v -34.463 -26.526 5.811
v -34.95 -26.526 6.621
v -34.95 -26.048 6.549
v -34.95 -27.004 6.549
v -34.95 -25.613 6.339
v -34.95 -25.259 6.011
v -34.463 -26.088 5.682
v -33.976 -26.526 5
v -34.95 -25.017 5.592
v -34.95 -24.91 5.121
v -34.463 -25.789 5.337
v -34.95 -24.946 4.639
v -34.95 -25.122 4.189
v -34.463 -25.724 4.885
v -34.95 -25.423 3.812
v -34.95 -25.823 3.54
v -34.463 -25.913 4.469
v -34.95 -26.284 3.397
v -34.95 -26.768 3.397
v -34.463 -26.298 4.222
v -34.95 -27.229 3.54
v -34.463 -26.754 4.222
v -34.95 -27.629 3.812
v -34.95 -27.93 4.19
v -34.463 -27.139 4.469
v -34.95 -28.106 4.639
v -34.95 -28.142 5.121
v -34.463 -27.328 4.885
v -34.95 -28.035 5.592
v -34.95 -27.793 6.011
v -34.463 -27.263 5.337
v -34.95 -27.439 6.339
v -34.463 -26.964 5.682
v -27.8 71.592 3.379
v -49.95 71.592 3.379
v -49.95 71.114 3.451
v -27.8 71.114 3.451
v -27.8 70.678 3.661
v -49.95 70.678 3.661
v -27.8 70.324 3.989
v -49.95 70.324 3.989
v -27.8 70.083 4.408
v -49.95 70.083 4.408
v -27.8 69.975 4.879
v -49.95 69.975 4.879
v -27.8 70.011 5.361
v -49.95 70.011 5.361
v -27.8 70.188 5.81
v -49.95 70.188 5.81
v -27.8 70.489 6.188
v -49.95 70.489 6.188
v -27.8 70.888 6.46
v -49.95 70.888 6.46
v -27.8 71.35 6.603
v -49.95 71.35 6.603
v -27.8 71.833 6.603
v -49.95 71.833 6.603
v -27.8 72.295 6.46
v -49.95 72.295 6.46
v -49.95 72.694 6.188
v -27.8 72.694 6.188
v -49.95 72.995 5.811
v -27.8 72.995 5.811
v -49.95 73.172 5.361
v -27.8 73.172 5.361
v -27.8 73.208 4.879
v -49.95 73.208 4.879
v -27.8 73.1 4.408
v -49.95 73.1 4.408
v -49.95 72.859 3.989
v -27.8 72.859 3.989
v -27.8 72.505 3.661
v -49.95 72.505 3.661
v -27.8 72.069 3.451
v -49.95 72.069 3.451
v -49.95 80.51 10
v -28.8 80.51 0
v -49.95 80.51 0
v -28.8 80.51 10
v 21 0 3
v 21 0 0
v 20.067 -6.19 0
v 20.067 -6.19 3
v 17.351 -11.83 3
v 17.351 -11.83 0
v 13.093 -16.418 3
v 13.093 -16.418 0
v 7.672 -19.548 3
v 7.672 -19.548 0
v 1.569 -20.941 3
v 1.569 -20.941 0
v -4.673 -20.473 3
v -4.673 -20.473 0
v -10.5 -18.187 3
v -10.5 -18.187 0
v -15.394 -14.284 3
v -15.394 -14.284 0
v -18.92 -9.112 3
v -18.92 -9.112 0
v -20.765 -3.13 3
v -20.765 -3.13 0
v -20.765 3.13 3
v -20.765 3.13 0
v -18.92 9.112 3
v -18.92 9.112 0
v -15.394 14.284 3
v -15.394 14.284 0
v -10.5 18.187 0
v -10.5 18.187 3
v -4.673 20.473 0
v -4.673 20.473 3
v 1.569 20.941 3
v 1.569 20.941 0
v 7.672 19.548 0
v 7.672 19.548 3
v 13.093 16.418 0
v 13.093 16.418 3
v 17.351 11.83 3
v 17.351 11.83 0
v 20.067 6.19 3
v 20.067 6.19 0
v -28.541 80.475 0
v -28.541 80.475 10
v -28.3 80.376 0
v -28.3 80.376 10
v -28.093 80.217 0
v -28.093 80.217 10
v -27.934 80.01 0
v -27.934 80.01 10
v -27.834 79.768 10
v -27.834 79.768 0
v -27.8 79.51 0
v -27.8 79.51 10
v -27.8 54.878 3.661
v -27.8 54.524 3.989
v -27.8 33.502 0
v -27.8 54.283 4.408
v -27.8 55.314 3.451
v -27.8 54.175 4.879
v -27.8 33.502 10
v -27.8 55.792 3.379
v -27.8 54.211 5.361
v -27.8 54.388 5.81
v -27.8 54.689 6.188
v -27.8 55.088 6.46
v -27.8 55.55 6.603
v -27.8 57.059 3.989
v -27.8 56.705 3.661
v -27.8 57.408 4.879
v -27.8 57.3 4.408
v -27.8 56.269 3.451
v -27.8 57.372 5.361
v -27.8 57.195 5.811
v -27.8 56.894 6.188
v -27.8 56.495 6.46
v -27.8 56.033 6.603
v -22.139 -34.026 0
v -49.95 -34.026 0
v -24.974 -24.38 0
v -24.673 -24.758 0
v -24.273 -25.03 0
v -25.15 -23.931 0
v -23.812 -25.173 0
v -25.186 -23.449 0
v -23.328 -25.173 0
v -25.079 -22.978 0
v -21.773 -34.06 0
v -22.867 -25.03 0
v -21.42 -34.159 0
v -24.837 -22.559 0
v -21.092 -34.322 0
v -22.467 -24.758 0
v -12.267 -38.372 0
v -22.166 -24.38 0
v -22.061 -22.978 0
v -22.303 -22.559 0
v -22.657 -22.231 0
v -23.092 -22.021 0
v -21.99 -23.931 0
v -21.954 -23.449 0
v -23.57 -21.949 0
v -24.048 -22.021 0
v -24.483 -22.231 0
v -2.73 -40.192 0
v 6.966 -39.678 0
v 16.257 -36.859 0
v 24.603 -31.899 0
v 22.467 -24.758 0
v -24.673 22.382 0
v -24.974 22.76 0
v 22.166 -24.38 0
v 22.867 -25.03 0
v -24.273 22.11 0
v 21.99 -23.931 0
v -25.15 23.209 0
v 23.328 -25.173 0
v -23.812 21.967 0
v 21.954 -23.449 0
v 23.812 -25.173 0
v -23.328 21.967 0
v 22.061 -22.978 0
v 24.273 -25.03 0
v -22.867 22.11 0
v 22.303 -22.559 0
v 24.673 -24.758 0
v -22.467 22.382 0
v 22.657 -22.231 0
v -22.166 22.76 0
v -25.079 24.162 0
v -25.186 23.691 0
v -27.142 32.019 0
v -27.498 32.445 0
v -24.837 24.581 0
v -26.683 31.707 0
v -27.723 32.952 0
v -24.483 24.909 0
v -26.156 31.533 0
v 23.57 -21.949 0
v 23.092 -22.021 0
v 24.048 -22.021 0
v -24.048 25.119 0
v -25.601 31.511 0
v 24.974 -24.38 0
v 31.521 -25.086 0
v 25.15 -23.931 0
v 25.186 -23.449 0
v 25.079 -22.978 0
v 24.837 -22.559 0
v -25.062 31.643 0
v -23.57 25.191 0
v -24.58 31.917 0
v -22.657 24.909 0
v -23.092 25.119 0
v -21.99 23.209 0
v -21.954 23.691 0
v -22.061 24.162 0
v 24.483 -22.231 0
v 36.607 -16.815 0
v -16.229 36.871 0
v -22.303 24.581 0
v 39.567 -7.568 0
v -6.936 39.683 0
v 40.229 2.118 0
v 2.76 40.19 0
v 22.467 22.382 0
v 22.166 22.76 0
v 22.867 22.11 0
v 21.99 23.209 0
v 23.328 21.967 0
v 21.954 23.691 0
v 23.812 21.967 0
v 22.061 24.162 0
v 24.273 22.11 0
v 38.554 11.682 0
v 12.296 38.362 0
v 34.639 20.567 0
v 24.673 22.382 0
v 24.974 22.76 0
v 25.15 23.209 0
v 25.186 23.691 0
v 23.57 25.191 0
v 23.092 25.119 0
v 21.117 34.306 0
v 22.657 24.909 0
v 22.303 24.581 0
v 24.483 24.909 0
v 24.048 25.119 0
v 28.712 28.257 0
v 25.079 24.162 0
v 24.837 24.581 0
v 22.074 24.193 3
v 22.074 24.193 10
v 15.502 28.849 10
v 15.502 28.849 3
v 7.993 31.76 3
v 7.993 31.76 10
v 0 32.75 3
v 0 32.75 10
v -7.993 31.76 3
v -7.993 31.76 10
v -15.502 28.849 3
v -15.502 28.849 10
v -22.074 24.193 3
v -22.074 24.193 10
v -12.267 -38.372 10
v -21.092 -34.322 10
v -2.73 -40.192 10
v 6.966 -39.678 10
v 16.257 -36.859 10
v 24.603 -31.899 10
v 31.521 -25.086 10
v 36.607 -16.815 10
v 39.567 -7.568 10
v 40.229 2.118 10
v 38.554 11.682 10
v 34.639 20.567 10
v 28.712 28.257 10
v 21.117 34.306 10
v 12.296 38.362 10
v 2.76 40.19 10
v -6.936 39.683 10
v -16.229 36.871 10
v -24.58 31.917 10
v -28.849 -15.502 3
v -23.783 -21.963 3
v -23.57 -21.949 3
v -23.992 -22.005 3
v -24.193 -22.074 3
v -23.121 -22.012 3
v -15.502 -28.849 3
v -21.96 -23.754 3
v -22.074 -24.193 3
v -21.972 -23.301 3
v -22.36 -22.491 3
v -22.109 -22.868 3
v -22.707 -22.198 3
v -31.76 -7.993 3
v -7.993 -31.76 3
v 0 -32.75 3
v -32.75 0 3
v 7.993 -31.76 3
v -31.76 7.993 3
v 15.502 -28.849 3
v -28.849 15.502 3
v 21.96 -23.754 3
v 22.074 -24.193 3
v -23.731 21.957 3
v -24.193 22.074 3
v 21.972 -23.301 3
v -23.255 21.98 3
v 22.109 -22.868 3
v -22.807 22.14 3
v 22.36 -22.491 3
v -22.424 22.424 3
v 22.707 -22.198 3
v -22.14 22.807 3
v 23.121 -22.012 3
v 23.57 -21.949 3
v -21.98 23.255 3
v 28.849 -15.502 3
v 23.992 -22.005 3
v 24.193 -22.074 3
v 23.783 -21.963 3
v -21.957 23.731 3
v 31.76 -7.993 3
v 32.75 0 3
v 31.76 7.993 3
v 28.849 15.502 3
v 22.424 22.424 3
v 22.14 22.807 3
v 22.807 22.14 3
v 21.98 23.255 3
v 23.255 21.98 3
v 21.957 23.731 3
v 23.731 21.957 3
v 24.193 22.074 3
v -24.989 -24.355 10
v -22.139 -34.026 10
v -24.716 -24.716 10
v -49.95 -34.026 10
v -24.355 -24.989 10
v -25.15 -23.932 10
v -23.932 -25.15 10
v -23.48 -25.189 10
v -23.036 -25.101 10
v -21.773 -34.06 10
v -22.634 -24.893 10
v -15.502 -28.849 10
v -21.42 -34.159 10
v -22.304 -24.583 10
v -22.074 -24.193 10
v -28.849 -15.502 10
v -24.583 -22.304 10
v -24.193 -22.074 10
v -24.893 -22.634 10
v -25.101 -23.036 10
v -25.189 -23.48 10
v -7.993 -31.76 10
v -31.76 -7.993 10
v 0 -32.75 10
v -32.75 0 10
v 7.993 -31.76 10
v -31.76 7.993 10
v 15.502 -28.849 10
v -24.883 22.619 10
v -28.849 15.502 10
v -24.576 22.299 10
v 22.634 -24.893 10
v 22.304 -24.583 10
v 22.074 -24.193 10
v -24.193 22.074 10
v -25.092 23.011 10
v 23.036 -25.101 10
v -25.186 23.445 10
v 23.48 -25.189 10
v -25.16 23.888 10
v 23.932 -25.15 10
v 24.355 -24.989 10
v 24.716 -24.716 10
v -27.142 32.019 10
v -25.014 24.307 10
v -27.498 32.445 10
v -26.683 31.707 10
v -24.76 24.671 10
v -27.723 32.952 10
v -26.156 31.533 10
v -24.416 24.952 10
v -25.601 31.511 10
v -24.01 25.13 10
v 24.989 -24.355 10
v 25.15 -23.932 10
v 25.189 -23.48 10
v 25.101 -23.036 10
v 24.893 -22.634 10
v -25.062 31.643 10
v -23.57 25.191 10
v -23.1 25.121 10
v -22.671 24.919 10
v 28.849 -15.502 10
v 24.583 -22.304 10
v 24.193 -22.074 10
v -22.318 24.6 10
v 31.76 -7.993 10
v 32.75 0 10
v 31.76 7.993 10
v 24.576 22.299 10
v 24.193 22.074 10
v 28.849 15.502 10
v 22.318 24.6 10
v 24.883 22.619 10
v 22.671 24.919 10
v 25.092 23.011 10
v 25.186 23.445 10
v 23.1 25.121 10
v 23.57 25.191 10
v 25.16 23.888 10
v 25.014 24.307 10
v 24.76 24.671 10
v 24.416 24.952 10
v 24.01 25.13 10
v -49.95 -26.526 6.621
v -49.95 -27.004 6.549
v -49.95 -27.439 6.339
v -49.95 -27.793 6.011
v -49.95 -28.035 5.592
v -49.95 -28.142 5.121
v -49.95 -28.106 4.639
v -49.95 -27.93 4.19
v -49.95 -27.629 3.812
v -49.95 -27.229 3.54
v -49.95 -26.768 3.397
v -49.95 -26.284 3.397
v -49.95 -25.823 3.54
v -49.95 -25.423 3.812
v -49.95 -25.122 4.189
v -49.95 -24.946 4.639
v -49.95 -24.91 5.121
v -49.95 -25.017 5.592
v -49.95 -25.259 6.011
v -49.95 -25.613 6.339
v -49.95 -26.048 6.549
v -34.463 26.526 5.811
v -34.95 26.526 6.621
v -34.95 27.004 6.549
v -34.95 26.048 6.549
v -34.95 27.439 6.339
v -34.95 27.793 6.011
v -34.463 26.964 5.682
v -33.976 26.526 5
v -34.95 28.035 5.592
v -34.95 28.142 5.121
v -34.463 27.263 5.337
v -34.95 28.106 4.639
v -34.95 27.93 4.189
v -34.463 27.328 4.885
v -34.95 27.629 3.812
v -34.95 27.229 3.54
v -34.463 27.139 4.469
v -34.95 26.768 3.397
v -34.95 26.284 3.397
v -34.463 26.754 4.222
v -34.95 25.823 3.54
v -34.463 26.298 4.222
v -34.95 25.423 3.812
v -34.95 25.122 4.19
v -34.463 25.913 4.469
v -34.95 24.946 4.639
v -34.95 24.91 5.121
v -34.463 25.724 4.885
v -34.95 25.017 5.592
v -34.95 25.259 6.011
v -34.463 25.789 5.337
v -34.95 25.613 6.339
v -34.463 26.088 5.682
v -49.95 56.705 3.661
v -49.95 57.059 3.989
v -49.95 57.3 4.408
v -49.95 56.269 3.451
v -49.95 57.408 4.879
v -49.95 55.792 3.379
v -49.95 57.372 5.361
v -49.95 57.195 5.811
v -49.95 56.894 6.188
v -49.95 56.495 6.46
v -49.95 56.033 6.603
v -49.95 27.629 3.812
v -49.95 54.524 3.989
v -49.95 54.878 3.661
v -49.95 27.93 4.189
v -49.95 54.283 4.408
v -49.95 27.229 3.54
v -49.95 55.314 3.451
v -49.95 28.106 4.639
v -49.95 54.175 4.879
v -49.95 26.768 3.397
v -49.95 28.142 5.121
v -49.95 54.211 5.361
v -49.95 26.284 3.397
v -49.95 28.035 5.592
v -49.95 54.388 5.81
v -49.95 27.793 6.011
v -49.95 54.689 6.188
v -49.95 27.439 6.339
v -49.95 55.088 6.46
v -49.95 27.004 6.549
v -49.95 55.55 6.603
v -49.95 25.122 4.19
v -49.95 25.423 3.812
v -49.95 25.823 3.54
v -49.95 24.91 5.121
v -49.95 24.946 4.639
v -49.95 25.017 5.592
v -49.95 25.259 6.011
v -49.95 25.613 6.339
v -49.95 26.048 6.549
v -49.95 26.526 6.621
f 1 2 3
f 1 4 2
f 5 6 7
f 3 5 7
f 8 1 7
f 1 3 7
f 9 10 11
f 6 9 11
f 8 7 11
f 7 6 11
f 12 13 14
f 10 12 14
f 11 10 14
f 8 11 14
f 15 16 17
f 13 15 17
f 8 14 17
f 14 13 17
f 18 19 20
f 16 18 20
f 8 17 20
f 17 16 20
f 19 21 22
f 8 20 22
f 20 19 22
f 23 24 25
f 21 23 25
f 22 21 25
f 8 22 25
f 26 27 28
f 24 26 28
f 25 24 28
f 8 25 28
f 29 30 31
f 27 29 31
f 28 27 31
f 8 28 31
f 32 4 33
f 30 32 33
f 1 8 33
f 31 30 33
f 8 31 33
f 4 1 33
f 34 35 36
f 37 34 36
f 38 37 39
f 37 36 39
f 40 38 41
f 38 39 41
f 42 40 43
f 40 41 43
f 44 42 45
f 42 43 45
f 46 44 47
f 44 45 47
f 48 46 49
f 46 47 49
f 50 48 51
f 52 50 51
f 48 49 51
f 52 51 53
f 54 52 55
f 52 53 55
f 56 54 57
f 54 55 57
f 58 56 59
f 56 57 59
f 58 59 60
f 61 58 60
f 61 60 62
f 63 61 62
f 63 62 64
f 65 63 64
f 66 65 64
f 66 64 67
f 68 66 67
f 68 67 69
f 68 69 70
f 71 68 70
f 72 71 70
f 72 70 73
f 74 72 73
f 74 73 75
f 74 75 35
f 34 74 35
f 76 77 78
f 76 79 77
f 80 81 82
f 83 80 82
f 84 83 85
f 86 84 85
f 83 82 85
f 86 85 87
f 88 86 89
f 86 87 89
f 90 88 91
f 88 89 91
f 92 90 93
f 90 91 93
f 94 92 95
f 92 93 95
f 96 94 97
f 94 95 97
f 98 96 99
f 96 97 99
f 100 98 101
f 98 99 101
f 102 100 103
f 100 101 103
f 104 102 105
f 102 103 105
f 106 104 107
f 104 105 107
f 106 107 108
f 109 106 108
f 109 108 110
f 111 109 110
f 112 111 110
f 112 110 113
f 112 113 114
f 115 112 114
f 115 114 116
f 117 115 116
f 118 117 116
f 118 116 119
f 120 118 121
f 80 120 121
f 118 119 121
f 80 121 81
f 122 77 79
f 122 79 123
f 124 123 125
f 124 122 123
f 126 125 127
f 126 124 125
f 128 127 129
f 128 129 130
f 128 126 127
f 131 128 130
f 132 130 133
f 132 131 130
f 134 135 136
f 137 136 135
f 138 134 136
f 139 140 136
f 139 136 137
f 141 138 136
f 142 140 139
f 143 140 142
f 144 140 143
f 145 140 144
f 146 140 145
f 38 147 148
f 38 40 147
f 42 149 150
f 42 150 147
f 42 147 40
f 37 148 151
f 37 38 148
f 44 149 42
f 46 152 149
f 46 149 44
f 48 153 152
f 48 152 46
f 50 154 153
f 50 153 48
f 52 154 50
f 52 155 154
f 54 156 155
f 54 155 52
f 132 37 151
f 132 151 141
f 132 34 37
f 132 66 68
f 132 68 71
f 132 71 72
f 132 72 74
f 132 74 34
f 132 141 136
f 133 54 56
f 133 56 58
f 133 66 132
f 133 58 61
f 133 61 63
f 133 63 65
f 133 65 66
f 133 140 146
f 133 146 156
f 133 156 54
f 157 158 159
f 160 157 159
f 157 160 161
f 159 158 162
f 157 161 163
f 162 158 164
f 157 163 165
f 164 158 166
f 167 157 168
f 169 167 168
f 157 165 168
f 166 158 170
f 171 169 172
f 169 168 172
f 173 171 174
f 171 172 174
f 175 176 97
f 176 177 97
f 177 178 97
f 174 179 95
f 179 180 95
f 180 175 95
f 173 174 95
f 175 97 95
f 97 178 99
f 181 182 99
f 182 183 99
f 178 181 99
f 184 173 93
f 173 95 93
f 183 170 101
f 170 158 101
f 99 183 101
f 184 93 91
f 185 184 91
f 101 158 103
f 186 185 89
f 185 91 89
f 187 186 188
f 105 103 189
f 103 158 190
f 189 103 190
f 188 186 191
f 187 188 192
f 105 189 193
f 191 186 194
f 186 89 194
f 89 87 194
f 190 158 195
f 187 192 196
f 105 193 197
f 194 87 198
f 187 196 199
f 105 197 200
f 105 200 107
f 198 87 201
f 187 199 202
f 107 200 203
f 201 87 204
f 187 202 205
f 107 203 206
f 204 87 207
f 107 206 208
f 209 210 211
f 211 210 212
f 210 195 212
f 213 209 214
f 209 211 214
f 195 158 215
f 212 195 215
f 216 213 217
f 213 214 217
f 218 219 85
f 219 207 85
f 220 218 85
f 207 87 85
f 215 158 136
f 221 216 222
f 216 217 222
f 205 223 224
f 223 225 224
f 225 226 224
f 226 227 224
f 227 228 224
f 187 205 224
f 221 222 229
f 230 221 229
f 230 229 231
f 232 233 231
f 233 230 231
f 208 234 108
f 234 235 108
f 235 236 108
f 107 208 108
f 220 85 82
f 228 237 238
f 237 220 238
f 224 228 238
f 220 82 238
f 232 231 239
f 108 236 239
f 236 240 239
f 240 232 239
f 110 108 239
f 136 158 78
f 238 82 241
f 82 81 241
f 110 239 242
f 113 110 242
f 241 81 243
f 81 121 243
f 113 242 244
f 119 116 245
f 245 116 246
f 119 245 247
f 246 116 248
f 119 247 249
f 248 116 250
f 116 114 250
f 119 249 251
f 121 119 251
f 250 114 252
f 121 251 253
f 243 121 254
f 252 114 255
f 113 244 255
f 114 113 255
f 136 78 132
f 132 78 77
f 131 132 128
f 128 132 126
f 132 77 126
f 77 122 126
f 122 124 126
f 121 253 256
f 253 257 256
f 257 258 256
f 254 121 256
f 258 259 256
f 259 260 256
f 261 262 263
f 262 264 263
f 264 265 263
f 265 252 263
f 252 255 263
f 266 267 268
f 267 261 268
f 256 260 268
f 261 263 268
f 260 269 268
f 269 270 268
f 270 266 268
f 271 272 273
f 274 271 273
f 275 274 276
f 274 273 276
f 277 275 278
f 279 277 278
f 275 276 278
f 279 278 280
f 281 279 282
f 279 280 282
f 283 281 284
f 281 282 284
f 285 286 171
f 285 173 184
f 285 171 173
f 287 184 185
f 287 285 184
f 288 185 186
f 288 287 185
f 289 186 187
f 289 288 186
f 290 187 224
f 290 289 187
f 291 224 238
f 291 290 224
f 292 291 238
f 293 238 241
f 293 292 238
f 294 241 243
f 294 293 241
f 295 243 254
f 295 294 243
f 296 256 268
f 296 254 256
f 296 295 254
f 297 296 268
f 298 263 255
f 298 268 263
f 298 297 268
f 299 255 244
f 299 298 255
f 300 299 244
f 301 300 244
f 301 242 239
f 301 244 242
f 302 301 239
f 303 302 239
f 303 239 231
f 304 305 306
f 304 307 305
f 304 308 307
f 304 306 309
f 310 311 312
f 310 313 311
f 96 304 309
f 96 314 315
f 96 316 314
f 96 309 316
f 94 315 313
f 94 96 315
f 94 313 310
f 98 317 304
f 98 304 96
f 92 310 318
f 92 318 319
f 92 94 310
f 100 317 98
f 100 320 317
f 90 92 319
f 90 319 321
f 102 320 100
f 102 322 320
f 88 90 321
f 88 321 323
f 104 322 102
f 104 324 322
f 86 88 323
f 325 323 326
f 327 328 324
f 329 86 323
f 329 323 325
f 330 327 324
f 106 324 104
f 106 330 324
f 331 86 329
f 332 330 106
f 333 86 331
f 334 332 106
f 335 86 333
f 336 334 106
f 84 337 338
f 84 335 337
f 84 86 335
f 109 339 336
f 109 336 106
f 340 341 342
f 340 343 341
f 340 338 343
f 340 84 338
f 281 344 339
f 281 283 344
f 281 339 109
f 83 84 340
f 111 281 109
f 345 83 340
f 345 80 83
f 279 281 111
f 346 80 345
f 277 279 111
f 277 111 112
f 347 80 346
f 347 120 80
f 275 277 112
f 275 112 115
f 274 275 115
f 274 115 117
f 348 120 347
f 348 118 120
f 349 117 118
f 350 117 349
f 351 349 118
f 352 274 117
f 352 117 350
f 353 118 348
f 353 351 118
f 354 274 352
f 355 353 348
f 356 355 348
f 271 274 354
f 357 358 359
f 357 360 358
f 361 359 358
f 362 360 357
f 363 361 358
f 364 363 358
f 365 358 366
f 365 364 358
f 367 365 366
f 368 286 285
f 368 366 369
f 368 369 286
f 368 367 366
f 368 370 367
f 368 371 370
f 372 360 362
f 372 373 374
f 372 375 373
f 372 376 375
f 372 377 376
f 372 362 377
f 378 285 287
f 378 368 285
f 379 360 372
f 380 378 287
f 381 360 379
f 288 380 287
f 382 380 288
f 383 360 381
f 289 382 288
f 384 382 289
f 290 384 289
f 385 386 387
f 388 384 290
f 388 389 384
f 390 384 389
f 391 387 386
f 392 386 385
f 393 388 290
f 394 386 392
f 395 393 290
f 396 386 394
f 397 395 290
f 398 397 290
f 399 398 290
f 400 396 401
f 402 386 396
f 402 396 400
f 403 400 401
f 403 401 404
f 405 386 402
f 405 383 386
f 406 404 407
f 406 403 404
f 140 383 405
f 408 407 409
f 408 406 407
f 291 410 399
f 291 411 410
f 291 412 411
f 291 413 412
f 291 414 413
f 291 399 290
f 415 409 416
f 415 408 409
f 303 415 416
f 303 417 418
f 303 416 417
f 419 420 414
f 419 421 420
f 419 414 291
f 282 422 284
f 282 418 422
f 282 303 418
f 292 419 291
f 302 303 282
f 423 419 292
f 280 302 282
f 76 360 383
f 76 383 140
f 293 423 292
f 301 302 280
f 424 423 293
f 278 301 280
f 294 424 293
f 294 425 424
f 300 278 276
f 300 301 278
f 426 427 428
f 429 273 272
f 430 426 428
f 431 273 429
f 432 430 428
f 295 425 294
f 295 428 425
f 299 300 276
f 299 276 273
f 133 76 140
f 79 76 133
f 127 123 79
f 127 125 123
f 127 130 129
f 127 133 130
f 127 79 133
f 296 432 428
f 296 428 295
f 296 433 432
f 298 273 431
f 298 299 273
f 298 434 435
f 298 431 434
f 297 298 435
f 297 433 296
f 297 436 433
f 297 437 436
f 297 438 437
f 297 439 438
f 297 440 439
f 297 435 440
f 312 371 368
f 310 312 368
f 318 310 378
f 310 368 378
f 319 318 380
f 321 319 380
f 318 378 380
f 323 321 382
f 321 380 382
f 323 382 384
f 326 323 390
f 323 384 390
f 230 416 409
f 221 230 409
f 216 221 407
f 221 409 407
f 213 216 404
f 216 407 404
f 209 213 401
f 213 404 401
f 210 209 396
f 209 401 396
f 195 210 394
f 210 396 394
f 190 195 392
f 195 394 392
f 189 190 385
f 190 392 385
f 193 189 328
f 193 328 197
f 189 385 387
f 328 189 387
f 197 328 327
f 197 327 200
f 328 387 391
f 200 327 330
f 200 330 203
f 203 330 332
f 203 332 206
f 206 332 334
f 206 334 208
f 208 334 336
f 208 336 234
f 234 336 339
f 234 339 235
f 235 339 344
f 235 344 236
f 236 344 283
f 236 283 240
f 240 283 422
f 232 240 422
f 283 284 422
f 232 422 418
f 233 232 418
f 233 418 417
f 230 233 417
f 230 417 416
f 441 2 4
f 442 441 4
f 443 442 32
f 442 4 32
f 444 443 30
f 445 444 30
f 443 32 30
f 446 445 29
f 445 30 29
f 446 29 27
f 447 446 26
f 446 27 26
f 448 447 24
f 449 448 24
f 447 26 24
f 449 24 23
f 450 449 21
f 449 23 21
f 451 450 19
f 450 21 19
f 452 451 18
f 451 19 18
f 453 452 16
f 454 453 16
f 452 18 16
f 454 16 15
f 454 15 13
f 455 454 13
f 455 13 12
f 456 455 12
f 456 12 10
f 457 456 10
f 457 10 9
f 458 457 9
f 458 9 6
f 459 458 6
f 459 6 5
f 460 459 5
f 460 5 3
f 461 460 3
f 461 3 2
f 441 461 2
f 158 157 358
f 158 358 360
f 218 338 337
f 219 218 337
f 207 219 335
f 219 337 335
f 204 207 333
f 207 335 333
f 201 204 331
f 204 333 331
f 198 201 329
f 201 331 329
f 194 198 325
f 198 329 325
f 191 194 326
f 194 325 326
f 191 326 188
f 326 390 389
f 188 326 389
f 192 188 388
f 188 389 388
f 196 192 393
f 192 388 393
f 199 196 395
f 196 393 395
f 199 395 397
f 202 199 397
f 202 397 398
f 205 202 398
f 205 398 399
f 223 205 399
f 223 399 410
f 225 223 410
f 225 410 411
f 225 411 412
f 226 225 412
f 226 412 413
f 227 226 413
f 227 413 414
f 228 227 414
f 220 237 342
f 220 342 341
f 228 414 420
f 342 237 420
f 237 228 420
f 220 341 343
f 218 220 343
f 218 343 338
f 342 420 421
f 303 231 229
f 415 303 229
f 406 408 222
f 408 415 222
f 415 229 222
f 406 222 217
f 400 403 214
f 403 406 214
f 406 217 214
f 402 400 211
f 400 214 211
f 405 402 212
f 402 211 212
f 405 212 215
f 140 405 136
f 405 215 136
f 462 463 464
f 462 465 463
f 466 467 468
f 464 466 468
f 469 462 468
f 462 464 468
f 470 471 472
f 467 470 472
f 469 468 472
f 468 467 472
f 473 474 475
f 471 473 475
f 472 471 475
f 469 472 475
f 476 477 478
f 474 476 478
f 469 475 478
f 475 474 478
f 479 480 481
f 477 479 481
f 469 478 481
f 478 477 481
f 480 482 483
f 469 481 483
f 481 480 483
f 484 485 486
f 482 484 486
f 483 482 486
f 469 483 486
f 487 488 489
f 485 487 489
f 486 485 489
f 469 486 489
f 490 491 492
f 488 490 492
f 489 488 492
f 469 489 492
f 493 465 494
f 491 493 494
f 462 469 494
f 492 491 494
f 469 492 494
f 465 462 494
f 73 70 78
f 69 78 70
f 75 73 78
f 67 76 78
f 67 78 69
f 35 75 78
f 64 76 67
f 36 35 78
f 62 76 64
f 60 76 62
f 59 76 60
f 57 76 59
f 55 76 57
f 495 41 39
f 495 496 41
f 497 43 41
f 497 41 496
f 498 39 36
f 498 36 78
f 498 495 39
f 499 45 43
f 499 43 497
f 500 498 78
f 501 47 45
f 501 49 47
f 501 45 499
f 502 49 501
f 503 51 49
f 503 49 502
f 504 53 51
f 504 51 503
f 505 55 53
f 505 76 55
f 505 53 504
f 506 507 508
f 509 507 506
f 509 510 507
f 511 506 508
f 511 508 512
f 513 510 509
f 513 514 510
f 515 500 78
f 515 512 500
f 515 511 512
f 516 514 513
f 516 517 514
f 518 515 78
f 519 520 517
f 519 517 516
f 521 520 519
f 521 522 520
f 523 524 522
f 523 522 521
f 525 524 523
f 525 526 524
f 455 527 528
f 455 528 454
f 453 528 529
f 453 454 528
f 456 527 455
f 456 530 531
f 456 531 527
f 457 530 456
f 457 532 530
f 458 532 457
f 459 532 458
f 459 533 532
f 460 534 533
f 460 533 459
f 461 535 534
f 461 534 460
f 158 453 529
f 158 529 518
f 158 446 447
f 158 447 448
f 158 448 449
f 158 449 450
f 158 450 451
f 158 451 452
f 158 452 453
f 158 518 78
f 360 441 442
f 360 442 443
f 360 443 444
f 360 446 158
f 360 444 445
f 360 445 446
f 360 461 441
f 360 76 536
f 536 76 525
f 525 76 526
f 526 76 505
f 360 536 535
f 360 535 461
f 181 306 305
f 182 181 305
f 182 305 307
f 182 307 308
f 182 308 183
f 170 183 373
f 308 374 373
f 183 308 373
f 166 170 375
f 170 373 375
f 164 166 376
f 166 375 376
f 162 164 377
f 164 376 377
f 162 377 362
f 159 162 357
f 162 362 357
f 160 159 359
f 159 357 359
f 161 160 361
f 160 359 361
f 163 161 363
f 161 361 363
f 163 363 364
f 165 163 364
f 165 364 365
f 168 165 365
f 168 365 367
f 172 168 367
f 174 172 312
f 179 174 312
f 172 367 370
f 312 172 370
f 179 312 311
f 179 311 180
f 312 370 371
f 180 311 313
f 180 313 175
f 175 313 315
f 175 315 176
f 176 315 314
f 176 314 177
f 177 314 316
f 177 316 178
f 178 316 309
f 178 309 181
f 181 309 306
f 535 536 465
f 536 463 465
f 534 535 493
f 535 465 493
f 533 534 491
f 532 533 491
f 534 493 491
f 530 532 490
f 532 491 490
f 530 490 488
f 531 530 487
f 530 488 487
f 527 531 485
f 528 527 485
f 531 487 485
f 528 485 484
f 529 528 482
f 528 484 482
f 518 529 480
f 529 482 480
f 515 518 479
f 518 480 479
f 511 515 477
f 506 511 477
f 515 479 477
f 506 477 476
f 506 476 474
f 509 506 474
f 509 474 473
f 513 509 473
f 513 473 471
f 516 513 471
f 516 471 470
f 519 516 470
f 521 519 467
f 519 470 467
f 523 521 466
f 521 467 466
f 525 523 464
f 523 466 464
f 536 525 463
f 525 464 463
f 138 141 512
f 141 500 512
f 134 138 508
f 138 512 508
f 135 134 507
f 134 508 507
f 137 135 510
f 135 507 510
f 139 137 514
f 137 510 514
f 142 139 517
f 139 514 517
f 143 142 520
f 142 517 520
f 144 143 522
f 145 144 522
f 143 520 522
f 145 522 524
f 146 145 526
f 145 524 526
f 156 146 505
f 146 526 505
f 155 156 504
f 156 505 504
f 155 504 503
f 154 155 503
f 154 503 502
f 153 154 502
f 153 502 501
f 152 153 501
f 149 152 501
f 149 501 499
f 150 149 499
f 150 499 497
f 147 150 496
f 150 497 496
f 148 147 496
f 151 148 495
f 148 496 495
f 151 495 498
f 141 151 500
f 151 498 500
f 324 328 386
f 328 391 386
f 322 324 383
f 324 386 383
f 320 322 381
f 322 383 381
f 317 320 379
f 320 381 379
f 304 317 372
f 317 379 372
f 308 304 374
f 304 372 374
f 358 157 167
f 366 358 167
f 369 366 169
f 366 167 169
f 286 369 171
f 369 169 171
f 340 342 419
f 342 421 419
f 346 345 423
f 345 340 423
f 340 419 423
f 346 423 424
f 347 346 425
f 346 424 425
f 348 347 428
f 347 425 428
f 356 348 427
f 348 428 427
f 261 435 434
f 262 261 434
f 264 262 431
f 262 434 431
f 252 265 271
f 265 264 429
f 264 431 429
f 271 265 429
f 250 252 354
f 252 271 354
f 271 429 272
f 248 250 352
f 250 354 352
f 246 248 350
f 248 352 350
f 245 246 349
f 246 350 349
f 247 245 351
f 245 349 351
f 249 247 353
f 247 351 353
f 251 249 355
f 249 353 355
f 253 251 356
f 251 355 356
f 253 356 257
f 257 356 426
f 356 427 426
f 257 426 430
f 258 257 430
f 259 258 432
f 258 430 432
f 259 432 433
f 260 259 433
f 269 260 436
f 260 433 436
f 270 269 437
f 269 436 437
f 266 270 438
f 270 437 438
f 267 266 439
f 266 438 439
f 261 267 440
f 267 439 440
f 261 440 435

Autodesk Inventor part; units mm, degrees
ref_plane "YZ Plane" through (0, 0, 0) normal (1, 0, 0) x (0, 1, 0)
ref_plane "XZ Plane" through (0, 0, 0) normal (0, 1, 0) x (-1, 0, 0)
ref_plane "Work Plane1" through (0, 0, 0) normal (0, 0, 1) x (1, 0, 0)
sketch "Sketch1" plane through (0, 0, 0) normal (0, 0, 1) x (1, 0, 0)
  circle A0 centre (0, 0) radius 21 projected
  circle A1 centre (23.57, -23.57) radius 2 projected
  circle A2 centre (23.57, 23.57) radius 2 projected
  circle A3 centre (-23.57, -23.57) radius 2.5 projected
  circle A4 centre (-23.57, 23.57) radius 2 projected
  circle A5 centre (-23.57, -23.57) radius 2 projected
  circle A6 centre (0, 0) radius 19 projected
  circle A7 centre (-23.57, 23.57) radius 2.5 projected
  circle A8 centre (-23.57, -23.57) radius 2.5 projected
  arc A9 (-29.95, -24.95) -> (-24.95, -29.95) centre (-24.95, -24.95) ccw projected
  line L0 (24.95, -29.95) -> (-24.95, -29.95) projected
  arc A10 (24.95, -29.95) -> (29.95, -24.95) centre (24.95, -24.95) ccw projected
  line L1 (29.95, 24.95) -> (29.95, -24.95) projected
  arc A11 (29.95, 24.95) -> (24.95, 29.95) centre (24.95, 24.95) ccw projected
  line L2 (-24.95, 29.95) -> (24.95, 29.95) projected
  arc A12 (-24.95, 29.95) -> (-29.95, 24.95) centre (-24.95, 24.95) ccw projected
  line L3 (-29.95, -24.95) -> (-29.95, 24.95) projected
  circle A13 centre (23.57, -23.57) radius 2.5 projected
  circle A14 centre (23.57, 23.57) radius 2.5 projected
  line L4 (-49.95, -90) -> (-49.95, 90) projected
  line L5 (-59.95, -90) -> (-49.95, -90)
  line L6 (-59.95, 90) -> (-49.95, 90)
  line L7 (40.2846, 0) -> (-40.2846, 0)
  line L8 (-49.95, -90) -> (-49.95, 90) projected
  line L9 (-59.95, -90) -> (-49.95, -90)
  line L10 (-49.95, 35.5095) -> (-26.95, 35.5095) projected
  line L11 (-24.95, 29.95) -> (-49.95, 29.95)
  line L12 (-24.95, -29.95) -> (-49.95, -29.95)
  circle A15 centre (0, 0) radius 22
  line L13 (-32.95, 22) -> (-32.95, -22) projected
  line L14 (-30.95, -14.95) -> (-49.95, -14.95)
  line L15 (-30.95, 14.95) -> (-49.95, 14.95)
  line L16 (-30.95, -14.95) -> (-30.95, 14.95)
  line L17 (24.7214, -34.026) -> (0, -42.0585)
  line L18 (0, -42.0585) -> (-24.7214, -34.026)
  line L19 (-24.7214, -34.026) -> (-40, -12.9968)
  line L20 (-40, -12.9968) -> (-40, 12.9968)
  line L21 (-40, 12.9968) -> (-24.7214, 34.026)
  line L22 (-24.7214, 34.026) -> (0, 42.0585)
  line L23 (0, 42.0585) -> (24.7214, 34.026)
  line L24 (24.7214, 34.026) -> (40, 12.9968)
  line L25 (40, 12.9968) -> (40, -12.9968)
  line L26 (40, -12.9968) -> (24.7214, -34.026)
  line L27 (-24.7214, -34.026) -> (-49.95, -34.026)
  line L28 (-24.7214, 34.026) -> (-49.95, 34.026)
  arc A16 (-24.7214, -34.026) -> (-24.7214, 34.026) centre (0, 0) ccw projected
  line L29 (-24.7214, 34.026) -> (-27.8, 34.026) projected
  line L30 (-27.8, 34.026) -> (-27.8, 80.5095) projected
  line L31 (-27.8, 80.5095) -> (-49.95, 80.5095) projected
  line L32 (-49.95, 80.5095) -> (-49.95, 14.95) projected
  line L33 (-49.95, 14.95) -> (-35.95, 14.95) projected
  arc A17 (-30.95, 9.95) -> (-35.95, 14.95) centre (-35.95, 9.95) ccw projected
  line L34 (-30.95, 9.95) -> (-30.95, -9.95) projected
  arc A18 (-35.95, -14.95) -> (-30.95, -9.95) centre (-35.95, -9.95) ccw projected
  line L35 (-35.95, -14.95) -> (-49.95, -14.95) projected
  line L36 (-49.95, -14.95) -> (-49.95, -34.026) projected
  line L37 (-49.95, -34.026) -> (-24.7214, -34.026) projected
  circle A19 centre (15.9909, -0.539) radius 1.6 projected
  circle A20 centre (-11.6884, -10.9261) radius 2 projected
  circle A21 centre (11.6884, 10.9261) radius 2 projected
  circle A22 centre (10.9261, -11.6884) radius 2 projected
  circle A23 centre (-15.9909, 0.539) radius 1.6 projected
  circle A24 centre (-0.539, -15.9909) radius 1.6 projected
  circle A25 centre (0, 0) radius 12.5 projected
  circle A26 centre (0.539, 15.9909) radius 1.6 projected
  circle A27 centre (-10.9261, 11.6884) radius 2 projected
  point P0 (0, 0)
  point P1 (-23.2856, -45.1645)
  point P2 (-49.95, -75.9684)
  point P3 (-23.2856, 45.1645)
  point P4 (-49.95, -14.95)
  point P5 (-32.95, 13.95)
  point P6 (-32.95, 14.95)
  dimension "d9" = 1
  dimension "d10" = 15
  dimension "d11" = 15
  dimension "d12" = 1
  dimension "d13" = 40
extrude "Extrusion1" add sketch "Sketch1" along normal blind 10 contours L7 A15 A0 | A0 L7 A15 | A15 L7 L3 A12 L2 A11 L1 | L7 L1 A10 L0 A9 L3 A15 | L7 L25 L26 L17 L18 L19 L12 L0 A10 L1 | L1 A11 L2 L11 L21 L22 L23 L24 L25 L7 | L7 L16 L15 L21 L11 A12 L3 | L3 A9 L12 L19 L14 L16 L7 | L25 A16 | L16 A18 L13 L7 | L7 L13 A17 L16 | L24 A16 | A16 L26 | L13 A18 L14 L19 L20 L7 | L7 L20 L21 L15 A17 L13 | L16 L14 L13 A18 | A17 L13 L15 L16 | L23 A16 | A16 L17 | L19 L27 L4 L12 | L12 L4 L14 L19 | L21 L15 L4 L11 | L11 L4 L28 L21 | L20 L19 L14 L4 L15 L21 | A17 L15 L13 | L13 L14 A18 | L22 A16 | A16 L18 | A1 | A2 | A3 | A4 | A5 | A7 | A13 | A14
sketch "Sketch2" plane through (-49.95, -34.026, 0) normal (-1, 0, 0) x (0, 0, 1)
  line L0 (0, 68.0521) -> (0, 0) projected
  line L1 (0, 0) -> (10, 0) projected
  line L2 (10, 68.0521) -> (10, 0) projected
  line L3 (0, 68.0521) -> (0, 0) projected
  line L4 (10, 68.0521) -> (10, 0) projected
  line L5 (0, 68.0521) -> (10, 68.0521) projected
  line L6 (0, 0) -> (10, 0) projected
  line L7 (0, 68.0521) -> (10, 68.0521) projected
  point P0 (0, 34.026)
  point P1 (5, 7.5)
  point P2 (5, 60.5521)
  point P3 (5, 68.0521)
  point P4 (5, 19.076)
  dimension "d24" = 7.5
  dimension "d25" = 7.5
hole "Hole1" at (-49.95, 26.526, 5) at (-49.95, -26.526, 5) direction (1, 0, 0) diameter 3.242 depth 15 tip angle 118 thread size "M4x0.7" class "6H" standard "ISO Metric profile"
sketch "Sketch3" plane through (0, 0, 10) normal (0, 0, 1) x (1, 0, 0)
  arc A0 (-24.7214, -34.026) -> (-24.7214, 34.026) centre (0, 0) ccw projected
  line L0 (-24.7214, 34.026) -> (-27.8, 34.026) projected
  line L1 (-27.8, 34.026) -> (-27.8, 80.5095) projected
  line L2 (-27.8, 80.5095) -> (-49.95, 80.5095) projected
  line L3 (-49.95, 80.5095) -> (-49.95, 14.95) projected
  line L4 (-49.95, 14.95) -> (-35.95, 14.95) projected
  arc A1 (-30.95, 9.95) -> (-35.95, 14.95) centre (-35.95, 9.95) ccw projected
  line L5 (-30.95, 9.95) -> (-30.95, -9.95) projected
  arc A2 (-35.95, -14.95) -> (-30.95, -9.95) centre (-35.95, -9.95) ccw projected
  line L6 (-35.95, -14.95) -> (-49.95, -14.95) projected
  line L7 (-49.95, -14.95) -> (-49.95, -34.026) projected
  line L8 (-49.95, -34.026) -> (-24.7214, -34.026) projected
  circle A3 centre (15.9909, -0.539) radius 1.6 projected
  circle A4 centre (-11.6884, -10.9261) radius 2 projected
  circle A5 centre (11.6884, 10.9261) radius 2 projected
  circle A6 centre (10.9261, -11.6884) radius 2 projected
  circle A7 centre (-15.9909, 0.539) radius 1.6 projected
  circle A8 centre (-0.539, -15.9909) radius 1.6 projected
  circle A9 centre (0, 0) radius 12.5 projected
  circle A10 centre (0.539, 15.9909) radius 1.6 projected
  circle A11 centre (-10.9261, 11.6884) radius 2 projected
  circle A12 centre (0, 0) radius 19 projected
  circle A13 centre (-23.57, 23.57) radius 2.5 projected
  circle A14 centre (-23.57, -23.57) radius 2.5 projected
  arc A15 (-29.95, -24.95) -> (-24.95, -29.95) centre (-24.95, -24.95) ccw projected
  line L9 (24.95, -29.95) -> (-24.95, -29.95) projected
  arc A16 (24.95, -29.95) -> (29.95, -24.95) centre (24.95, -24.95) ccw projected
  line L10 (29.95, 24.95) -> (29.95, -24.95) projected
  arc A17 (29.95, 24.95) -> (24.95, 29.95) centre (24.95, 24.95) ccw projected
  line L11 (-24.95, 29.95) -> (24.95, 29.95) projected
  arc A18 (-24.95, 29.95) -> (-29.95, 24.95) centre (-24.95, 24.95) ccw projected
  line L12 (-29.95, -24.95) -> (-29.95, 24.95) projected
  circle A19 centre (23.57, -23.57) radius 2.5 projected
  circle A20 centre (23.57, 23.57) radius 2.5 projected
  arc A21 (-37.4079, -14.95) -> (-37.4079, 14.95) centre (0, 0) ccw
  line L13 (-27.8, 34.026) -> (-27.8, 29.155)
  line L14 (-49.95, -34.026) -> (-21.5657, -34.026)
  line L15 (-49.95, -34.026) -> (-24.7214, -34.026) projected
  point P0 (0, 0)
  point P1 (-24.7214, -34.026)
extrude "Extrusion2" cut sketch "Sketch3" against normal blind 10 contours L14 A21 L13 L0 A0
sketch "Sketch4" plane through (0, 0, 10) normal (0, 0, 1) x (1, 0, 0)
  arc A0 (-24.7214, -34.026) -> (-24.7214, 34.026) centre (0, 0) ccw projected
  line L0 (-24.7214, 34.026) -> (-27.8, 34.026) projected
  line L1 (-27.8, 34.026) -> (-27.8, 80.5095) projected
  line L2 (-27.8, 80.5095) -> (-49.95, 80.5095) projected
  line L3 (-49.95, 80.5095) -> (-49.95, 14.95) projected
  line L4 (-49.95, 14.95) -> (-35.95, 14.95) projected
  arc A1 (-30.95, 9.95) -> (-35.95, 14.95) centre (-35.95, 9.95) ccw projected
  line L5 (-30.95, 9.95) -> (-30.95, -9.95) projected
  arc A2 (-35.95, -14.95) -> (-30.95, -9.95) centre (-35.95, -9.95) ccw projected
  line L6 (-35.95, -14.95) -> (-49.95, -14.95) projected
  line L7 (-49.95, -14.95) -> (-49.95, -34.026) projected
  line L8 (-49.95, -34.026) -> (-24.7214, -34.026) projected
  circle A3 centre (15.9909, -0.539) radius 1.6 projected
  circle A4 centre (-11.6884, -10.9261) radius 2 projected
  circle A5 centre (11.6884, 10.9261) radius 2 projected
  circle A6 centre (10.9261, -11.6884) radius 2 projected
  circle A7 centre (-15.9909, 0.539) radius 1.6 projected
  circle A8 centre (-0.539, -15.9909) radius 1.6 projected
  circle A9 centre (0, 0) radius 12.5 projected
  circle A10 centre (0.539, 15.9909) radius 1.6 projected
  circle A11 centre (-10.9261, 11.6884) radius 2 projected
  line L9 (-49.95, -90) -> (-49.95, 90) projected
  line L10 (-59.95, 90) -> (-49.95, 90)
  line L11 (-49.95, -90) -> (-49.95, 90) projected
  line L12 (-27.8, 29.155) -> (-27.8, 34.026) projected
  line L13 (-27.8, 34.026) -> (-49.95, 34.026) projected
  line L14 (-49.95, 34.026) -> (-49.95, -34.026) projected
  line L15 (-49.95, -34.026) -> (-21.5657, -34.026) projected
  arc A12 (-21.5657, -34.026) -> (-27.8, 29.155) centre (0, 0) ccw projected
  circle A13 centre (0, 0) radius 21 projected
  point P0 (0, 0)
extrude "Extrusion3" add sketch "Sketch4" against normal blind 10 contours L13 L3 L2 L1
fillet "Fillet1" radius 2 2 edges at (-27.8, 29.155, 5) (-21.5657, -34.026, 5)
fillet "Fillet2" radius 1 1 edges at (-27.8, 80.5095, 5)
sketch "Sketch5" plane through (-27.8, 33.5015, 10) normal (1, 0, 0) x (0, 0, -1)
  arc A0 (8, 9.19) -> (10, 11.19) centre (8, 11.19) ccw projected
  line L0 (10, 49.19) -> (10, 11.19) projected
  arc A1 (10, 49.19) -> (8, 51.19) centre (8, 49.19) ccw projected
  line L1 (-60.5, 51.19) -> (8, 51.19) projected
  arc A2 (-60.5, 51.19) -> (-62.5, 49.19) centre (-60.5, 49.19) ccw projected
  line L2 (-62.5, 11.19) -> (-62.5, 49.19) projected
  arc A3 (-62.5, 11.19) -> (-60.5, 9.19) centre (-60.5, 11.19) ccw projected
  line L3 (8, 9.19) -> (-60.5, 9.19) projected
  circle A4 centre (-26.25, 30.19) radius 12.6 projected
  circle A5 centre (-26.25, 14.19) radius 2 projected
  arc A6 (-59.6, 14.79) -> (-55.4, 14.79) centre (-57.5, 14.79) ccw projected
  line L4 (-59.6, 45.59) -> (-59.6, 14.79) projected
  arc A7 (-55.4, 45.59) -> (-59.6, 45.59) centre (-57.5, 45.59) ccw projected
  line L5 (-55.4, 14.79) -> (-55.4, 45.59) projected
  circle A8 centre (-42.25, 30.19) radius 2 projected
  circle A9 centre (-37.5637, 18.8763) radius 1.5 projected
  circle A10 centre (-37.5637, 41.5037) radius 1.5 projected
  circle A11 centre (-14.9363, 18.8763) radius 1.5 projected
  arc A12 (7.1, 45.59) -> (2.9, 45.59) centre (5, 45.59) ccw projected
  line L6 (7.1, 14.79) -> (7.1, 45.59) projected
  arc A13 (2.9, 14.79) -> (7.1, 14.79) centre (5, 14.79) ccw projected
  line L7 (2.9, 45.59) -> (2.9, 14.79) projected
  circle A14 centre (-10.25, 30.19) radius 2 projected
  circle A15 centre (-14.9363, 41.5037) radius 1.5 projected
  circle A16 centre (-26.25, 46.19) radius 2 projected
  circle A17 centre (-57.5, 11.46) radius 1.621 projected
  circle A18 centre (-57.5, 26.86) radius 1.621 projected
  arc A19 (8, 9.19) -> (10, 11.19) centre (8, 11.19) ccw projected
  line L8 (10, 49.19) -> (10, 11.19) projected
  arc A20 (10, 49.19) -> (8, 51.19) centre (8, 49.19) ccw projected
  line L9 (-60.5, 51.19) -> (8, 51.19) projected
  arc A21 (-60.5, 51.19) -> (-62.5, 49.19) centre (-60.5, 49.19) ccw projected
  line L10 (-62.5, 11.19) -> (-62.5, 49.19) projected
  arc A22 (-62.5, 11.19) -> (-60.5, 9.19) centre (-60.5, 11.19) ccw projected
  line L11 (8, 9.19) -> (-60.5, 9.19) projected
  circle A23 centre (-26.25, 30.19) radius 12.6 projected
  circle A24 centre (-26.25, 14.19) radius 2 projected
  arc A25 (-59.6, 14.79) -> (-55.4, 14.79) centre (-57.5, 14.79) ccw projected
  line L12 (-59.6, 45.59) -> (-59.6, 14.79) projected
  arc A26 (-55.4, 45.59) -> (-59.6, 45.59) centre (-57.5, 45.59) ccw projected
  line L13 (-55.4, 14.79) -> (-55.4, 45.59) projected
  circle A27 centre (-42.25, 30.19) radius 2 projected
  circle A28 centre (-37.5637, 18.8763) radius 1.5 projected
  circle A29 centre (-37.5637, 41.5037) radius 1.5 projected
  circle A30 centre (-14.9363, 18.8763) radius 1.5 projected
  arc A31 (7.1, 45.59) -> (2.9, 45.59) centre (5, 45.59) ccw projected
  line L14 (7.1, 14.79) -> (7.1, 45.59) projected
  arc A32 (2.9, 14.79) -> (7.1, 14.79) centre (5, 14.79) ccw projected
  line L15 (2.9, 45.59) -> (2.9, 14.79) projected
  circle A33 centre (-10.25, 30.19) radius 2 projected
  circle A34 centre (-14.9363, 41.5037) radius 1.5 projected
  circle A35 centre (-26.25, 46.19) radius 2 projected
  arc A36 (8, 9.19) -> (10, 11.19) centre (8, 11.19) ccw projected
  line L16 (10, 49.19) -> (10, 11.19) projected
  arc A37 (10, 49.19) -> (8, 51.19) centre (8, 49.19) ccw projected
  line L17 (-60.5, 51.19) -> (8, 51.19) projected
  arc A38 (-60.5, 51.19) -> (-62.5, 49.19) centre (-60.5, 49.19) ccw projected
  line L18 (-62.5, 11.19) -> (-62.5, 49.19) projected
  arc A39 (-62.5, 11.19) -> (-60.5, 9.19) centre (-60.5, 11.19) ccw projected
  line L19 (8, 9.19) -> (-60.5, 9.19) projected
  circle A40 centre (-26.25, 30.19) radius 12.6 projected
  circle A41 centre (-26.25, 14.19) radius 2 projected
  arc A42 (-59.6, 14.79) -> (-55.4, 14.79) centre (-57.5, 14.79) ccw projected
  line L20 (-59.6, 45.59) -> (-59.6, 14.79) projected
  arc A43 (-55.4, 45.59) -> (-59.6, 45.59) centre (-57.5, 45.59) ccw projected
  line L21 (-55.4, 14.79) -> (-55.4, 45.59) projected
  circle A44 centre (-42.25, 30.19) radius 2 projected
  circle A45 centre (-37.5637, 18.8763) radius 1.5 projected
  circle A46 centre (-37.5637, 41.5037) radius 1.5 projected
  circle A47 centre (-14.9363, 18.8763) radius 1.5 projected
  arc A48 (7.1, 45.59) -> (2.9, 45.59) centre (5, 45.59) ccw projected
  line L22 (7.1, 14.79) -> (7.1, 45.59) projected
  arc A49 (2.9, 14.79) -> (7.1, 14.79) centre (5, 14.79) ccw projected
  line L23 (2.9, 45.59) -> (2.9, 14.79) projected
  circle A50 centre (-10.25, 30.19) radius 2 projected
  circle A51 centre (-14.9363, 41.5037) radius 1.5 projected
  circle A52 centre (-26.25, 46.19) radius 2 projected
  point P0 (10, -33.5015)
  point P1 (5, 22.29)
  point P2 (5, 38.09)
  dimension "d47" = 7.5
  dimension "d48" = 7.5
hole "Hole2" at (-27.8, 55.7915, 5) at (-27.8, 71.5915, 5) direction (-1, 0, 0) diameter 3.242 depth 22.15 thread size "M4x0.7" class "6H" standard "ISO Metric profile"
sketch "Sketch7" plane through (0, 0, 10) normal (0, 0, 1) x (1, 0, 0)
  circle A0 centre (0, 0) radius 32.75
  dimension "d49" = 65.5
extrude "Extrusion5" cut sketch "Sketch7" against normal blind 7
sketch "Sketch10" plane through (0, 0, 0) normal (0, 0, -1) x (-1, 0, 0)
  point P0 (0, 0)
  point P1 (-23.57, -23.57)
  point P2 (-23.57, 23.57)
  point P3 (23.57, 23.57)
  point P4 (23.57, -23.57)
hole "Hole3" at (23.57, -23.57, 0) at (23.57, 23.57, 0) at (-23.57, 23.57, 0) at (-23.57, -23.57, 0) direction (0, 0, 1) diameter 3.242 depth 12 tip angle 118 thread size "M4x0.7" class "6H" standard "ISO Metric profile"
equation "\"d11\" = d10"
equation "\"d25\" = d24"
equation "\"d48\" = d47"
properties part number "base frame achterkant 10 mm" material "Aluminum 6061"
